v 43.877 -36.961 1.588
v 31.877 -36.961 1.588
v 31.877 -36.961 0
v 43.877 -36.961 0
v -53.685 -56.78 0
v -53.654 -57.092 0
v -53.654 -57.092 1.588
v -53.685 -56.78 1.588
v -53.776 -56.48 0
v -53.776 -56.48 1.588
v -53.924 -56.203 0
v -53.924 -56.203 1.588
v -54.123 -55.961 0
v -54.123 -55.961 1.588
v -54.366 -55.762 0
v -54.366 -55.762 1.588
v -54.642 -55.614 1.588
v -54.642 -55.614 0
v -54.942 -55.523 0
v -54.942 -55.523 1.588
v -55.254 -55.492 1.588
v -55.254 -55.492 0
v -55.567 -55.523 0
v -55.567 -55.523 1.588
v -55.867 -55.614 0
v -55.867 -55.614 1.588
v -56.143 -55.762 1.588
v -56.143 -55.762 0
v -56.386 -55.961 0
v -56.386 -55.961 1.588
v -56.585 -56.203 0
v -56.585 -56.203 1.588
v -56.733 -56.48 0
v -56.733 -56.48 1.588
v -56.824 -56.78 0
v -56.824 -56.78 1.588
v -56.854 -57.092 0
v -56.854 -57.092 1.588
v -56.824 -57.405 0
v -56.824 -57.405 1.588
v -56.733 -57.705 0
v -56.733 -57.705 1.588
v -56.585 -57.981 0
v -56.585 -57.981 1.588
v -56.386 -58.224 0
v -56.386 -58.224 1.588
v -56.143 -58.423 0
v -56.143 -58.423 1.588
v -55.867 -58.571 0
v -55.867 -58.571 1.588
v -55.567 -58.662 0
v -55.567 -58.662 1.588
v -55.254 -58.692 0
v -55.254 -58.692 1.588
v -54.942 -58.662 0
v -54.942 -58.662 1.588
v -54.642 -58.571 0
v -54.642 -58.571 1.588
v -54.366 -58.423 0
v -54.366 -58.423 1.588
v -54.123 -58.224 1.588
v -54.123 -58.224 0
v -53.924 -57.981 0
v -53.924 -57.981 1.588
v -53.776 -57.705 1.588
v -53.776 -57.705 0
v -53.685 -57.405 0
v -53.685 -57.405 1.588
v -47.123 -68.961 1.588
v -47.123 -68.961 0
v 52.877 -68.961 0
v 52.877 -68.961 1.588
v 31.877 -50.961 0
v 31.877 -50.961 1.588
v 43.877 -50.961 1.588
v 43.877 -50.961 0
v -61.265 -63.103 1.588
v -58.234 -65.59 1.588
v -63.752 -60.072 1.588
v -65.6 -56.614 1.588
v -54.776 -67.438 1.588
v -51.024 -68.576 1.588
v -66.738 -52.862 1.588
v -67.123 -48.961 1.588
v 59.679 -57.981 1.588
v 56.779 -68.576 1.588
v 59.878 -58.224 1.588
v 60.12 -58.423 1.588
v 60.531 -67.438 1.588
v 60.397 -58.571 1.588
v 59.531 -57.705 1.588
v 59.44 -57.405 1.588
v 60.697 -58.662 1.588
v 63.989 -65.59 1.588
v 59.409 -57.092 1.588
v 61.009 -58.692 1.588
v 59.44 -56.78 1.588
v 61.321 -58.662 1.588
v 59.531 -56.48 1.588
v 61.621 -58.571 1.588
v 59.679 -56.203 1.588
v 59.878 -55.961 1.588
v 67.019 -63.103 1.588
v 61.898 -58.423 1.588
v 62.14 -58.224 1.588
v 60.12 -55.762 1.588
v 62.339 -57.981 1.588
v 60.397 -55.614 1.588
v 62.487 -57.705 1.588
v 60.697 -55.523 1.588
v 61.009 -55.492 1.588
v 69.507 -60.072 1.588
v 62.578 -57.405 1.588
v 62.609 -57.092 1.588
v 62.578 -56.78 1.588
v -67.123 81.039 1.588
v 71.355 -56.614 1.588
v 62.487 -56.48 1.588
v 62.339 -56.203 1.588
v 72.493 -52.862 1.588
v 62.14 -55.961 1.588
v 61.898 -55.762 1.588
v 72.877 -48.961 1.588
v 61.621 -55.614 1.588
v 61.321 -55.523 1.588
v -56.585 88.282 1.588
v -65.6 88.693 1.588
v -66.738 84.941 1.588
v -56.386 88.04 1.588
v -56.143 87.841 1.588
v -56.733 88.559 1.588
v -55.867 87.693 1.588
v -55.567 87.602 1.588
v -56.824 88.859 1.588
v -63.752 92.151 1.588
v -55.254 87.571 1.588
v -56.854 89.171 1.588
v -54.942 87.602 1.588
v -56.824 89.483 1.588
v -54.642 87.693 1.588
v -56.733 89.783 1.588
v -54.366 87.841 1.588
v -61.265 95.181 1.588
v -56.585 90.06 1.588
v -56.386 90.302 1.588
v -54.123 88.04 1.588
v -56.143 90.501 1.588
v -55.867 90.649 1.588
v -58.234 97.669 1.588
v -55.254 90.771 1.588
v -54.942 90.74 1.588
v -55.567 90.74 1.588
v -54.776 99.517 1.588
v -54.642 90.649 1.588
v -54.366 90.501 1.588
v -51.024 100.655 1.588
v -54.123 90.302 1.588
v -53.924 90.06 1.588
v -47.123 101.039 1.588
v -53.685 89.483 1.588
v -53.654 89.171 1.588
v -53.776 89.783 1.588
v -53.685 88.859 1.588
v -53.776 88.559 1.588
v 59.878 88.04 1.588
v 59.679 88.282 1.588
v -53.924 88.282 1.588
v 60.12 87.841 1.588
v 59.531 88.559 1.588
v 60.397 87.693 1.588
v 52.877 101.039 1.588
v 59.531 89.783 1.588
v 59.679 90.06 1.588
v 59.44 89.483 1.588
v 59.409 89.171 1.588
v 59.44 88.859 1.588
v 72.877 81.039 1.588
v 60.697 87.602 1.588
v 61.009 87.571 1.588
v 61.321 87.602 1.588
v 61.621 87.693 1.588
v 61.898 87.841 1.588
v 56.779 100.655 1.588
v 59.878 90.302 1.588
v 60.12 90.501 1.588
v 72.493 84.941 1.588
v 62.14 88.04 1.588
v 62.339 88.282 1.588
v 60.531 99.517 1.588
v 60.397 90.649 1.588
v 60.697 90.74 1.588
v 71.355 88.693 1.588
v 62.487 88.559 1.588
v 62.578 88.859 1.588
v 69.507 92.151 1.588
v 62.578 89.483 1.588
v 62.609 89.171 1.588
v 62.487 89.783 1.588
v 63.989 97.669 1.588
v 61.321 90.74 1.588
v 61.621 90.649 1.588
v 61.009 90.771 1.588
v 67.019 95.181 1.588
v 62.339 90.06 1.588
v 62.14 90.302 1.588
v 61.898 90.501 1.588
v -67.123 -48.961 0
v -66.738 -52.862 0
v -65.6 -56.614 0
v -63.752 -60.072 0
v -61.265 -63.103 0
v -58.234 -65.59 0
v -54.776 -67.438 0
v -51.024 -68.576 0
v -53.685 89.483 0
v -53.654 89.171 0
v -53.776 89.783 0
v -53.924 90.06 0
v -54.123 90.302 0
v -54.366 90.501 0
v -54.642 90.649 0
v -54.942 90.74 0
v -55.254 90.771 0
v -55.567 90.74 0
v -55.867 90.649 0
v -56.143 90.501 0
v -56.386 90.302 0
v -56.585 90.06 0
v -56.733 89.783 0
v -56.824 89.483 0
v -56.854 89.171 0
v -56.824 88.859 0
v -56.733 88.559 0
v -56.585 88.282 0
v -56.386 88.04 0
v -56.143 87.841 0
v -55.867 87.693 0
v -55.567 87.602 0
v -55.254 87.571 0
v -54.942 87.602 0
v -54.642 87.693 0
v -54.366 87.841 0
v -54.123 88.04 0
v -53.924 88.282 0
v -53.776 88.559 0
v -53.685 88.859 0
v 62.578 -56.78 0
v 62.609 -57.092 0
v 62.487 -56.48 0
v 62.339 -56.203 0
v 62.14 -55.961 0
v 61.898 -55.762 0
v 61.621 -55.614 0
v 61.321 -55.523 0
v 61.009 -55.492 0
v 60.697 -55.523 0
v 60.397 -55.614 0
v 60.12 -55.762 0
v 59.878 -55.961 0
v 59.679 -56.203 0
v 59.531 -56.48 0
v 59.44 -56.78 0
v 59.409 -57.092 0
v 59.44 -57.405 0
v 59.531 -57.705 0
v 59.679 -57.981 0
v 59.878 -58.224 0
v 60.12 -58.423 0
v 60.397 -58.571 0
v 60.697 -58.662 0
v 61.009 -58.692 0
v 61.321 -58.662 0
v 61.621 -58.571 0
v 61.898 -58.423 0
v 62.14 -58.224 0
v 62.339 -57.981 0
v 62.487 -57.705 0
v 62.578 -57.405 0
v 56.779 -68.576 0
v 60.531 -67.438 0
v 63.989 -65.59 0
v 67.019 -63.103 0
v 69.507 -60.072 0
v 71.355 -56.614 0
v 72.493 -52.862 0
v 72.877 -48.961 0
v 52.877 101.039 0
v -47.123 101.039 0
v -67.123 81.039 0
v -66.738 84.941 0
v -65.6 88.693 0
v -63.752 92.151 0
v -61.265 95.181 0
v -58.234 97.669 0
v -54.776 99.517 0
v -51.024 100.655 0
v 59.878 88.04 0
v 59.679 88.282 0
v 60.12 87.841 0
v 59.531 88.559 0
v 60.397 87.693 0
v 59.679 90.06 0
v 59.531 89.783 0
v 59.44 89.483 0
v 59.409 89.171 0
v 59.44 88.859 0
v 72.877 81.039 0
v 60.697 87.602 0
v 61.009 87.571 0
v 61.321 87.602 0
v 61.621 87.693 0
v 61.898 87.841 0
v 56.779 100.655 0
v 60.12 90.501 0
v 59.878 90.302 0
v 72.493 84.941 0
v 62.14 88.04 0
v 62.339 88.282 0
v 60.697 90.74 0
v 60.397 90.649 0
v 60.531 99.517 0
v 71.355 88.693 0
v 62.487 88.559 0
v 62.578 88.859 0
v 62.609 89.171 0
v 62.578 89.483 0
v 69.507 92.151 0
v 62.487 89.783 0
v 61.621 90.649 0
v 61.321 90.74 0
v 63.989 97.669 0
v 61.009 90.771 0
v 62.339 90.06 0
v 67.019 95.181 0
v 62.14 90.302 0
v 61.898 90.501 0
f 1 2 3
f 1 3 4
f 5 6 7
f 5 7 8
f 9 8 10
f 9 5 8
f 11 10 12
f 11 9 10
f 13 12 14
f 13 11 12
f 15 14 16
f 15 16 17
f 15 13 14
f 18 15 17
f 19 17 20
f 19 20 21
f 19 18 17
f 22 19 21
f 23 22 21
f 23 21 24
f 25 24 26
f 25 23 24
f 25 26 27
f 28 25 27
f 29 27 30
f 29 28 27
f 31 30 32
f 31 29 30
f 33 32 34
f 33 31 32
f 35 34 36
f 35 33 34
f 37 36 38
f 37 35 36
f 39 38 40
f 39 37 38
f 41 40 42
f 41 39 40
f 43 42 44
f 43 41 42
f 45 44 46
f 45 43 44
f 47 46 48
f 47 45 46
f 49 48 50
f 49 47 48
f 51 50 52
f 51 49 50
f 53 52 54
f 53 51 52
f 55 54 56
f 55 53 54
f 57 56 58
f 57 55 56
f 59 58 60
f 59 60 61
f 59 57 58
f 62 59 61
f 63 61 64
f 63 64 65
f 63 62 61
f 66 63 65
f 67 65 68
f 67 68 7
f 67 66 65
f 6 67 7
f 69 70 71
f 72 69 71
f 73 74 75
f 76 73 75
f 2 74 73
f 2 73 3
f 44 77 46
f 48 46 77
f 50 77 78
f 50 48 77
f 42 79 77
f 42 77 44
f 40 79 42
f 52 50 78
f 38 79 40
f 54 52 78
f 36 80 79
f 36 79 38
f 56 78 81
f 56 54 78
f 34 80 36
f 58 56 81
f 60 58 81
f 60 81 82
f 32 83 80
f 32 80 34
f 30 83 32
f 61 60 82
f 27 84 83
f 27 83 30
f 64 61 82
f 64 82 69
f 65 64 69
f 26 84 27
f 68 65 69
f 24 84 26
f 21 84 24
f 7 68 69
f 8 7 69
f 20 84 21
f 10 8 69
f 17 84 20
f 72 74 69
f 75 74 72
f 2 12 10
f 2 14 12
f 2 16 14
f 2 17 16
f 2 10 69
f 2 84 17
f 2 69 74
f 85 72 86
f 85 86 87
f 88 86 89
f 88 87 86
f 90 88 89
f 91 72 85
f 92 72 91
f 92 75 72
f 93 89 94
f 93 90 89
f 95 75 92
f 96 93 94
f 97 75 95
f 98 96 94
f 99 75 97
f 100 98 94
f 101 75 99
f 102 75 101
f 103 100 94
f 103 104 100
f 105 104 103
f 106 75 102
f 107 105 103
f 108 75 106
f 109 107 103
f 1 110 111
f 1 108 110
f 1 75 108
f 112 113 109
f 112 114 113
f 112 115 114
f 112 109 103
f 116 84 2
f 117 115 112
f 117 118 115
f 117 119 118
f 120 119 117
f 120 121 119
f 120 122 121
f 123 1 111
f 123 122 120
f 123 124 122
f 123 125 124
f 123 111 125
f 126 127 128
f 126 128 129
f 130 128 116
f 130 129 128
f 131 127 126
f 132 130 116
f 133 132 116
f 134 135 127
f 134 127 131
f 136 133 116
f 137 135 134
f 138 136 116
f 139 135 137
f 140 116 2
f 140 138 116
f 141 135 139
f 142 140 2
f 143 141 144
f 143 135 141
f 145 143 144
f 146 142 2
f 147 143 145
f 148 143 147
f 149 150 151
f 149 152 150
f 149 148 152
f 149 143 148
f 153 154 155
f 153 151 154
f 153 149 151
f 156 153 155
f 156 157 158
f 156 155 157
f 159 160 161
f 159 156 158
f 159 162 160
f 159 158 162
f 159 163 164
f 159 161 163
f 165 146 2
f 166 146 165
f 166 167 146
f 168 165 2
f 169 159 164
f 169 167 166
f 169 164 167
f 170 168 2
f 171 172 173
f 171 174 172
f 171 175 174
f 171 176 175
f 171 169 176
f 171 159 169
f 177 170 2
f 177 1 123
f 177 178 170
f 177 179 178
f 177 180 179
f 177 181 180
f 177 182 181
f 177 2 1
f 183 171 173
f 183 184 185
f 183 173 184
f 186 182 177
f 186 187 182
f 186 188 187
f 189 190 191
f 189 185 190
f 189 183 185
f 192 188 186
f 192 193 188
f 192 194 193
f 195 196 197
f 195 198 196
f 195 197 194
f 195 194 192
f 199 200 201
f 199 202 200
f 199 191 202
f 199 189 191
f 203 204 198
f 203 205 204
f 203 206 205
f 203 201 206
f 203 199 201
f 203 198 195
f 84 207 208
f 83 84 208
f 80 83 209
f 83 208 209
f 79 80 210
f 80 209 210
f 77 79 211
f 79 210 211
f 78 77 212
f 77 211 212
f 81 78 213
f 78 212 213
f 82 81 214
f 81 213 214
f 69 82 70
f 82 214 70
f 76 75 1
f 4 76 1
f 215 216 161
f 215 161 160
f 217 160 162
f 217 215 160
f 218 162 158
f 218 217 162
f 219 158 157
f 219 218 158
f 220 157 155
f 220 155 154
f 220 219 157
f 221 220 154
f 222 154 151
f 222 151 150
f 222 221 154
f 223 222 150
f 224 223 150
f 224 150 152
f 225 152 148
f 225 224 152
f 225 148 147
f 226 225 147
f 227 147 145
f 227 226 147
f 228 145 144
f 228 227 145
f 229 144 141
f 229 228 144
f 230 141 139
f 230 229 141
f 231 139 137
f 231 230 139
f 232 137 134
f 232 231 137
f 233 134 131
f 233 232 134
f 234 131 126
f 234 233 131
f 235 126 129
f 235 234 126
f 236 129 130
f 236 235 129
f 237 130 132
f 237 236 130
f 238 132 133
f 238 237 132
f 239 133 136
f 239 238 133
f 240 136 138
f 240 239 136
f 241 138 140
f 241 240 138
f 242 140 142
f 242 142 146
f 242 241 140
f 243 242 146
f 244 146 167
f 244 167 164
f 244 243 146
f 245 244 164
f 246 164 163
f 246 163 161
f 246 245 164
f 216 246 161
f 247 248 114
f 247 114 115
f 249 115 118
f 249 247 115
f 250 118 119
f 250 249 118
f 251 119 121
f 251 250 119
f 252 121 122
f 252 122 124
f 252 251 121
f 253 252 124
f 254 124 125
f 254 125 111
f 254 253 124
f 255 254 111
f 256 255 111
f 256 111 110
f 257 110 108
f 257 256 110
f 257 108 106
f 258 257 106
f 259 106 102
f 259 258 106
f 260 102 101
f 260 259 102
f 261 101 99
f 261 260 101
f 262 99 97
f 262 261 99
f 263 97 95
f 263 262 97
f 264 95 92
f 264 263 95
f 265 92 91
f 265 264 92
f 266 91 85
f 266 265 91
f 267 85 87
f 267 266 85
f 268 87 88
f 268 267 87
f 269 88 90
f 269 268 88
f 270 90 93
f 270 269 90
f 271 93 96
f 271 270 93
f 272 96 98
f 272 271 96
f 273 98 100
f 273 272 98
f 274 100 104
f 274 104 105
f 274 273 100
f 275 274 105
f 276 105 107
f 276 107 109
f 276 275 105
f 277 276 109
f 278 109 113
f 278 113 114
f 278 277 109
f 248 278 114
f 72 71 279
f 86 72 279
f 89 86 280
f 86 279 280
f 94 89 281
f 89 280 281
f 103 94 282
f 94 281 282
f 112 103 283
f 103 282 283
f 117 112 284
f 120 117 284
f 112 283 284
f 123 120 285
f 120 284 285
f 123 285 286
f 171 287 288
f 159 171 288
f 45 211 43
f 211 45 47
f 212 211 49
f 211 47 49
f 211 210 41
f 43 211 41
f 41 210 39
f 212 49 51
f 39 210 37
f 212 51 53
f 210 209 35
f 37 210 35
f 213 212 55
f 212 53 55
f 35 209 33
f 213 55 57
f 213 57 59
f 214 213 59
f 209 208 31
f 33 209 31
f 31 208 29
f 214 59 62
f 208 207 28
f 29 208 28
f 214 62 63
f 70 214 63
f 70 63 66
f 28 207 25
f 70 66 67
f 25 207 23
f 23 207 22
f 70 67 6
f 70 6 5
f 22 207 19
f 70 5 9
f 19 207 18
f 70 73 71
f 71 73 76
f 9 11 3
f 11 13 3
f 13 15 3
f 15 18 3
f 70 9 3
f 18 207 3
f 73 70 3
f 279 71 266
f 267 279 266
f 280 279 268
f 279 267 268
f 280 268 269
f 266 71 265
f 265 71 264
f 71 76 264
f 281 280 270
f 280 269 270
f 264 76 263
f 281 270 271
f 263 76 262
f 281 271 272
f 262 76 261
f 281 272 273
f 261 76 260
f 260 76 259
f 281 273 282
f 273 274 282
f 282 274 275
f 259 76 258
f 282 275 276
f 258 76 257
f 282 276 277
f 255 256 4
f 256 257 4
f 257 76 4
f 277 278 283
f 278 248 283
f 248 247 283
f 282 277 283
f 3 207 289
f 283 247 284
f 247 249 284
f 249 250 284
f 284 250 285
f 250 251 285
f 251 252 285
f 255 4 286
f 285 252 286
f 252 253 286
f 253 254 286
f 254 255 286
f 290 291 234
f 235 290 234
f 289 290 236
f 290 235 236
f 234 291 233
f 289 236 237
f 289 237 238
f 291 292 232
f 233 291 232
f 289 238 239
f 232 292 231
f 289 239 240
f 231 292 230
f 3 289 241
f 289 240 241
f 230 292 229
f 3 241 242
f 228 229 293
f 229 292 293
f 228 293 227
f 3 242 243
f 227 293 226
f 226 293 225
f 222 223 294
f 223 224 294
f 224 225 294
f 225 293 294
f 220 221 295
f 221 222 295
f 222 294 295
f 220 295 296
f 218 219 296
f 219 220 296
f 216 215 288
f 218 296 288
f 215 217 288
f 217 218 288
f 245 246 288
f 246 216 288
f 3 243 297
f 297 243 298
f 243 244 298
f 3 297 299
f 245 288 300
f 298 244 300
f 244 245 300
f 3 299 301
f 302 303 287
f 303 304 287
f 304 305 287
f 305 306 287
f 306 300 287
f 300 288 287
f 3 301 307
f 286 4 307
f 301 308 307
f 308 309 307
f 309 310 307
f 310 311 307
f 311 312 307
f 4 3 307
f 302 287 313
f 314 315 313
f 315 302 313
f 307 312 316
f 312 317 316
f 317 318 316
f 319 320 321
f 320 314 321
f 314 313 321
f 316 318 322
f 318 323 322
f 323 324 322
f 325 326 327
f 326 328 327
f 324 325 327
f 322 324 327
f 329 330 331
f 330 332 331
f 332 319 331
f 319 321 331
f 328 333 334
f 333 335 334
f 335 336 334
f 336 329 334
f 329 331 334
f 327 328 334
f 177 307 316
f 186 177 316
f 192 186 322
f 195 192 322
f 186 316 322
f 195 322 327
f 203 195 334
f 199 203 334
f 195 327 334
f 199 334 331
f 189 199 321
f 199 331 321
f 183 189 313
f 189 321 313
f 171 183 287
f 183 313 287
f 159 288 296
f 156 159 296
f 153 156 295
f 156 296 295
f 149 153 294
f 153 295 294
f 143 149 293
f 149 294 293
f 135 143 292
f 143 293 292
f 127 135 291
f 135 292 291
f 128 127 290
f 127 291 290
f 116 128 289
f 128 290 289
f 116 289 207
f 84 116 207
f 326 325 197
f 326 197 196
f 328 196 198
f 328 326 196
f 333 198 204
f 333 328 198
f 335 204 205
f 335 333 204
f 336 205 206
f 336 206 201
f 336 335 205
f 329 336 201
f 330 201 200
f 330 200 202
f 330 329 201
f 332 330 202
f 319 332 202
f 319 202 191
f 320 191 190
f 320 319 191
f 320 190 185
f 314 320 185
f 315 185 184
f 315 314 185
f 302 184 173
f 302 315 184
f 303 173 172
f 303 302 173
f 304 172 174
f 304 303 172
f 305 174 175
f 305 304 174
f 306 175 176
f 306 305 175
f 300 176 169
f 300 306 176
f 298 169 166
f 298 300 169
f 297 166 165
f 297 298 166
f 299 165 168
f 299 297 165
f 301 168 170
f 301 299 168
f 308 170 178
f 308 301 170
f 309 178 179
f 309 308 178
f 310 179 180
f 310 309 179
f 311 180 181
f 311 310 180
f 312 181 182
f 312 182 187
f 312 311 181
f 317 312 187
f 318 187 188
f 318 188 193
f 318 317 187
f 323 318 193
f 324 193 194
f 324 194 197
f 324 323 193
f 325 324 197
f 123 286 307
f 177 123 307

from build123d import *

# Parameters (mm, degrees)
SKETCH1_R           = 1.6
BOSS_EXTRUDE1_DEPTH = 1.5875
SKETCH3_W           = 12
SKETCH3_H           = 14
CUT_EXTRUDE1_DEPTH  = 125.589614038


with BuildPart() as part:
    # Sketch1 → Boss-Extrude1 (new body)
    with BuildSketch(Plane.XY):
        with BuildLine():
            Line((52.877308189, 101.03934739), (-47.122691811, 101.03934739))
            ThreePointArc((-47.122691811, 101.03934739), (-61.264827435, 95.181483014), (-67.122691811, 81.03934739))
            Line((-67.122691811, 81.03934739), (-67.122691811, -48.96065261))
            ThreePointArc((-67.122691811, -48.96065261), (-61.264827435, -63.102788233), (-47.122691811, -68.96065261))
            Line((-47.122691811, -68.96065261), (52.877308189, -68.96065261))
            ThreePointArc((52.877308189, -68.96065261), (67.019443812, -63.102788233), (72.877308189, -48.96065261))
            Line((72.877308189, -48.96065261), (72.877308189, 81.03934739))
            ThreePointArc((72.877308189, 81.03934739), (67.019443812, 95.181483014), (52.877308189, 101.03934739))
        make_face()
        with Locations((-55.254419795, -57.092380593)):
            Circle(SKETCH1_R, mode=Mode.SUBTRACT)
        with Locations((61.009036172, -57.092380593)):
            Circle(SKETCH1_R, mode=Mode.SUBTRACT)
        with Locations((61.009036172, 89.171075374)):
            Circle(SKETCH1_R, mode=Mode.SUBTRACT)
        with Locations((-55.254419795, 89.171075374)):
            Circle(SKETCH1_R, mode=Mode.SUBTRACT)
    extrude(amount=BOSS_EXTRUDE1_DEPTH)

    # Sketch3 → Cut-Extrude1 (cut, through all)
    with BuildSketch(Plane.XY.offset(1.5875)):
        with Locations((37.877308189, -43.96065261)):
            Rectangle(SKETCH3_W, SKETCH3_H)
    extrude(amount=-CUT_EXTRUDE1_DEPTH, mode=Mode.SUBTRACT)


solid = part.part
